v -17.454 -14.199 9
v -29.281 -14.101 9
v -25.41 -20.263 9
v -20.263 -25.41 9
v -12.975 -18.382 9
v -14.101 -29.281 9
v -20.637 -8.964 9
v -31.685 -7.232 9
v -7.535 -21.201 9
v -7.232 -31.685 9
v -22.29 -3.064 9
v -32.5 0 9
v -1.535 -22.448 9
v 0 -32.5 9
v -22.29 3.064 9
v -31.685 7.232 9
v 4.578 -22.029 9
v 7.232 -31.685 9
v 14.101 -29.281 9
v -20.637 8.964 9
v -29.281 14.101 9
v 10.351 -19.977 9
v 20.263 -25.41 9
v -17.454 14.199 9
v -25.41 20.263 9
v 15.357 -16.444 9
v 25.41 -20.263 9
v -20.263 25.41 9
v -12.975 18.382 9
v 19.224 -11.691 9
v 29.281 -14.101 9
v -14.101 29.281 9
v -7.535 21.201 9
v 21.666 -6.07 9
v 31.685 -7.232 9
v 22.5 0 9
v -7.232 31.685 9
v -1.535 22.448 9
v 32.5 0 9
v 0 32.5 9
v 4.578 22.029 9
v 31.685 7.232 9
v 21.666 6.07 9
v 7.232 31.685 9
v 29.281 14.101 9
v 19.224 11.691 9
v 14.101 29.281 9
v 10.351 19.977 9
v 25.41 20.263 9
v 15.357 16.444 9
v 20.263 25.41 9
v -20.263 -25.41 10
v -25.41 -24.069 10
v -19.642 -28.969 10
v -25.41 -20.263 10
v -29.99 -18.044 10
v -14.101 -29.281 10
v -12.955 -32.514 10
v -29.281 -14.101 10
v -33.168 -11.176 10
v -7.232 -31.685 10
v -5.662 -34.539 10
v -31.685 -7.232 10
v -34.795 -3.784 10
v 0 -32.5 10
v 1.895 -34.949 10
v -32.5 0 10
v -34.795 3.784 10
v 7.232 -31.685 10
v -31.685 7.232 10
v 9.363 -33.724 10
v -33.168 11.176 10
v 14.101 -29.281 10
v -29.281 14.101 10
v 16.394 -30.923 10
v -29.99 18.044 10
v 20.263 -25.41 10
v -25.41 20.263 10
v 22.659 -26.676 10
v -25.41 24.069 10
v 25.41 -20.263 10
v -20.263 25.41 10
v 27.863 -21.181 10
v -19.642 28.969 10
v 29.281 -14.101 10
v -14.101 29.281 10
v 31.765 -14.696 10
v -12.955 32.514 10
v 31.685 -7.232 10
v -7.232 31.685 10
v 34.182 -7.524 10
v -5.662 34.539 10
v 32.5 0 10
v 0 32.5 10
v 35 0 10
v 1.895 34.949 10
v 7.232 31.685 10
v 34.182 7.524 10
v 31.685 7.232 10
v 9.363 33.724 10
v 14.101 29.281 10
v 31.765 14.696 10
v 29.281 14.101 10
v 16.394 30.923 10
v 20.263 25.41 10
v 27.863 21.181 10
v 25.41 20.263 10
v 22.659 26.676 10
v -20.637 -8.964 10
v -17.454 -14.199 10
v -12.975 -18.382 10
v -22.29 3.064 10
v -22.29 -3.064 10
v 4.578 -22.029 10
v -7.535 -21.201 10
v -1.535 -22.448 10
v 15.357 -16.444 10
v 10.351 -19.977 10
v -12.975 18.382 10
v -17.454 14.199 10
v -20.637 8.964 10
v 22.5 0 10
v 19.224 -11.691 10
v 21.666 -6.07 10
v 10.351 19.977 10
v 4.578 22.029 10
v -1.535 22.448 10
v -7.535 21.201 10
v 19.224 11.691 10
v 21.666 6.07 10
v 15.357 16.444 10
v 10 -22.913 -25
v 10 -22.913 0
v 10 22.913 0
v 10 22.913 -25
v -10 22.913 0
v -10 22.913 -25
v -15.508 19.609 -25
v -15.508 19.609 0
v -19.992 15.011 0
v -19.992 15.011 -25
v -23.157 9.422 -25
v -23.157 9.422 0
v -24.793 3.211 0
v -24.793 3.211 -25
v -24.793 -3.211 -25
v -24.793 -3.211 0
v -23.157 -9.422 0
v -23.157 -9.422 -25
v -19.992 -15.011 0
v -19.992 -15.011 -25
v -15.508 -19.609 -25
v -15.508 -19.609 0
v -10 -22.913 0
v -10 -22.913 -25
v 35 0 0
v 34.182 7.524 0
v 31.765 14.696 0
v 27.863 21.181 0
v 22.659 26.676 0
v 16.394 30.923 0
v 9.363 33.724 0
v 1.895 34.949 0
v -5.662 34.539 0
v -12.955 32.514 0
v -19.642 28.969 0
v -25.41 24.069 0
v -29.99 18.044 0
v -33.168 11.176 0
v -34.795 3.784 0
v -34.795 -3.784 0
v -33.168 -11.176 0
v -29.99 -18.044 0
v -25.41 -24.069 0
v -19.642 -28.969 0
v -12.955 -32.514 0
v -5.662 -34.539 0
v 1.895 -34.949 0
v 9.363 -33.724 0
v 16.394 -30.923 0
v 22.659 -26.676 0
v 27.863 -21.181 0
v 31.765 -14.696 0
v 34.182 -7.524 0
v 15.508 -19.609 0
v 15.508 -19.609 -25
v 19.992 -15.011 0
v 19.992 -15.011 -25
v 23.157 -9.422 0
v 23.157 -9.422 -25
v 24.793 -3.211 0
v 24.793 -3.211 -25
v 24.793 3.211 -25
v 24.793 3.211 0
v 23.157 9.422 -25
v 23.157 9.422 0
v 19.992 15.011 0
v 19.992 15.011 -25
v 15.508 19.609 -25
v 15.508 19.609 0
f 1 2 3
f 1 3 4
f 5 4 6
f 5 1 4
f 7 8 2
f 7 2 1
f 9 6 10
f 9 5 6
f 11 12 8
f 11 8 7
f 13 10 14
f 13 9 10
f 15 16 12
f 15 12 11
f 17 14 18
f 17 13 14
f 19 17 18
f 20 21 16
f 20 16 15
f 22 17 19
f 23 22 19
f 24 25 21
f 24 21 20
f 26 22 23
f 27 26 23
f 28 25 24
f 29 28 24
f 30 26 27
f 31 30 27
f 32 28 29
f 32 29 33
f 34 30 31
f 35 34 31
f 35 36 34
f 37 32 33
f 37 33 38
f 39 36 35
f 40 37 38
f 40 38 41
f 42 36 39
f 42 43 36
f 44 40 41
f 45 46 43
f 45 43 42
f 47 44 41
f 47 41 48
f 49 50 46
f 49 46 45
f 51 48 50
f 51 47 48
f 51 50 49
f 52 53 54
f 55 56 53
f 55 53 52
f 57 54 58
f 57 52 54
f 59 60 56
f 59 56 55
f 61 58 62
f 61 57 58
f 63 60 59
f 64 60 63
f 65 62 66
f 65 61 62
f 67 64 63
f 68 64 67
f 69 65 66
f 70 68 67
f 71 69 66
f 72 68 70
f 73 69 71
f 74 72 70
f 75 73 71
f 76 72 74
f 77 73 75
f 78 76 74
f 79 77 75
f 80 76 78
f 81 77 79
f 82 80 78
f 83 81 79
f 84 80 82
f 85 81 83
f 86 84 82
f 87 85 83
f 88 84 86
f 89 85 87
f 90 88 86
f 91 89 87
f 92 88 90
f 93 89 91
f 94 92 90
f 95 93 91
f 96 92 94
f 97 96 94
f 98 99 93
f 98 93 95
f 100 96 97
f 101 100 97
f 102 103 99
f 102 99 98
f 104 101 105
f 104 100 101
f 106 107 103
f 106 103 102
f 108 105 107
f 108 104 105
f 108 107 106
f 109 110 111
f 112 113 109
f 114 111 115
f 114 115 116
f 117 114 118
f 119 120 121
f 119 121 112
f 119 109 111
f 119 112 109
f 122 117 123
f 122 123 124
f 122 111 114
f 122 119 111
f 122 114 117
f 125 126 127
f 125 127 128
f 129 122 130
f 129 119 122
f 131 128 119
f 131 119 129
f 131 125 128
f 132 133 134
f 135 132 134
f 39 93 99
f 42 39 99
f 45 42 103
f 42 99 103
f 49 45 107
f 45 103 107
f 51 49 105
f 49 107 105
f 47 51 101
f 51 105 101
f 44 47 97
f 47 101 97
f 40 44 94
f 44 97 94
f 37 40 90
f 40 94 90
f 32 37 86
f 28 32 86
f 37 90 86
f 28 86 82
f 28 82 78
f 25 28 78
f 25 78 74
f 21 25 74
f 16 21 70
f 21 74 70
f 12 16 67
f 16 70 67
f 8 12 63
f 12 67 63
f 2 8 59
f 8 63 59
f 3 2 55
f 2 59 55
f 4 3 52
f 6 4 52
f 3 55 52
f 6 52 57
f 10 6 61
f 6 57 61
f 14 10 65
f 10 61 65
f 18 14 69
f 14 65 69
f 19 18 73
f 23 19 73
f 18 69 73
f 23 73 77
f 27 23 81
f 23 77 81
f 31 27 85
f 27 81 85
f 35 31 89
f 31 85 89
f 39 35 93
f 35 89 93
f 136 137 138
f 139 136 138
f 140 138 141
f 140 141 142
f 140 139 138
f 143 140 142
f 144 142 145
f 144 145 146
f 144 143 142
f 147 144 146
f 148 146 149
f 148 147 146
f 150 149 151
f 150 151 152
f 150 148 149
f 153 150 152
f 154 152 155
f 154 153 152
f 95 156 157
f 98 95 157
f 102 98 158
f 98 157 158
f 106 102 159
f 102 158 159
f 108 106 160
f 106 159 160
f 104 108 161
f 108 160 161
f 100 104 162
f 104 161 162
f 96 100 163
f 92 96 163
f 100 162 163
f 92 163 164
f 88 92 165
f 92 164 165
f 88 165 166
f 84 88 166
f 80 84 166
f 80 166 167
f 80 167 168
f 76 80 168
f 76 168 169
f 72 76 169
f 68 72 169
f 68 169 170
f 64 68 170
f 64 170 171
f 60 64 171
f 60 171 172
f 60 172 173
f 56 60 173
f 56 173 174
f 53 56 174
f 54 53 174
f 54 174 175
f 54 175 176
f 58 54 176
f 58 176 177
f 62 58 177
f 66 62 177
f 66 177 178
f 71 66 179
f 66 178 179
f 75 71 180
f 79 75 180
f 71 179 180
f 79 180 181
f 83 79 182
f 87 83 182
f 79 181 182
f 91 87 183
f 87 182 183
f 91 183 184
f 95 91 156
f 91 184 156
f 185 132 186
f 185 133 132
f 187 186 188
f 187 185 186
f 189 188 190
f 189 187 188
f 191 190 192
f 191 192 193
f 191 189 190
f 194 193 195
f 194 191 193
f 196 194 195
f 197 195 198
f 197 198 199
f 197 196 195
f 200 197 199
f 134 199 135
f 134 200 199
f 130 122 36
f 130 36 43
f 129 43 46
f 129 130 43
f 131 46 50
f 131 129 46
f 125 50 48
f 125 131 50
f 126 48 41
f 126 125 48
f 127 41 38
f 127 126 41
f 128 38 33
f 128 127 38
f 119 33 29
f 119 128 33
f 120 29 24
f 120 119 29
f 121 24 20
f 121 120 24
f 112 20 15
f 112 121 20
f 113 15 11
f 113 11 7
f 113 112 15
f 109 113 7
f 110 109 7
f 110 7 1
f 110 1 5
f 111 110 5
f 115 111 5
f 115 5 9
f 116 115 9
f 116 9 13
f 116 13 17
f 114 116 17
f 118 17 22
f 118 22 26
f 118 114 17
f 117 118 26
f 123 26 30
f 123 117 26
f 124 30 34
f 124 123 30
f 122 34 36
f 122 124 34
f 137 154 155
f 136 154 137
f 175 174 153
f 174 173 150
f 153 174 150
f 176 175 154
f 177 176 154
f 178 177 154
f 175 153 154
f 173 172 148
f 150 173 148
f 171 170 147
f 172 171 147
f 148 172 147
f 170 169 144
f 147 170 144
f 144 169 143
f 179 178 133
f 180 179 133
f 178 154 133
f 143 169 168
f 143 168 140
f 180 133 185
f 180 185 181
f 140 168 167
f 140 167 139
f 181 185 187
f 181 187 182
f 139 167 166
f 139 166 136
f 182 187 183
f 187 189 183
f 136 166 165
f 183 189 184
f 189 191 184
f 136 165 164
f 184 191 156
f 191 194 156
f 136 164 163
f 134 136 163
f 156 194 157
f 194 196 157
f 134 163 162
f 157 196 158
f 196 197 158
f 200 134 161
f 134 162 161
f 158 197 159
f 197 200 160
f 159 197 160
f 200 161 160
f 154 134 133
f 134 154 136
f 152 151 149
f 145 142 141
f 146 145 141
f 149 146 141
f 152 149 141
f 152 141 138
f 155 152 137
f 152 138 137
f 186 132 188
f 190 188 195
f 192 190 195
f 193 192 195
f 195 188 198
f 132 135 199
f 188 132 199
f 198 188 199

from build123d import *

# Parameters (mm, degrees)
F0_R     = 35
F1_DEPTH = 10
F2_R     = 25
F3_DEPTH = 25
F4_W     = 20
F4_H     = 80
F5_DEPTH = 25
F7_R     = 32.5
F7_R_2   = 22.5
F8_DEPTH = 1


with BuildPart() as f1:
    # F0 (on Top) → F1 (new body)
    with BuildSketch(Plane.XY):
        Circle(F0_R)
    extrude(amount=F1_DEPTH)

    # F2 (on Top) → F3 (join)
    with BuildSketch(Plane.XY):
        Circle(F2_R)
    extrude(amount=-F3_DEPTH)

    # F4 (on Top) → F5 (cut)
    with BuildSketch(Plane.XY):
        Rectangle(F4_W, F4_H)
    extrude(amount=-F5_DEPTH, mode=Mode.SUBTRACT)

    # F7 (on offset) → F8 (cut)
    with BuildSketch(Plane.XY.offset(10)):
        Circle(F7_R)
        Circle(F7_R_2, mode=Mode.SUBTRACT)
    extrude(amount=-F8_DEPTH, mode=Mode.SUBTRACT)


solid = f1.part
